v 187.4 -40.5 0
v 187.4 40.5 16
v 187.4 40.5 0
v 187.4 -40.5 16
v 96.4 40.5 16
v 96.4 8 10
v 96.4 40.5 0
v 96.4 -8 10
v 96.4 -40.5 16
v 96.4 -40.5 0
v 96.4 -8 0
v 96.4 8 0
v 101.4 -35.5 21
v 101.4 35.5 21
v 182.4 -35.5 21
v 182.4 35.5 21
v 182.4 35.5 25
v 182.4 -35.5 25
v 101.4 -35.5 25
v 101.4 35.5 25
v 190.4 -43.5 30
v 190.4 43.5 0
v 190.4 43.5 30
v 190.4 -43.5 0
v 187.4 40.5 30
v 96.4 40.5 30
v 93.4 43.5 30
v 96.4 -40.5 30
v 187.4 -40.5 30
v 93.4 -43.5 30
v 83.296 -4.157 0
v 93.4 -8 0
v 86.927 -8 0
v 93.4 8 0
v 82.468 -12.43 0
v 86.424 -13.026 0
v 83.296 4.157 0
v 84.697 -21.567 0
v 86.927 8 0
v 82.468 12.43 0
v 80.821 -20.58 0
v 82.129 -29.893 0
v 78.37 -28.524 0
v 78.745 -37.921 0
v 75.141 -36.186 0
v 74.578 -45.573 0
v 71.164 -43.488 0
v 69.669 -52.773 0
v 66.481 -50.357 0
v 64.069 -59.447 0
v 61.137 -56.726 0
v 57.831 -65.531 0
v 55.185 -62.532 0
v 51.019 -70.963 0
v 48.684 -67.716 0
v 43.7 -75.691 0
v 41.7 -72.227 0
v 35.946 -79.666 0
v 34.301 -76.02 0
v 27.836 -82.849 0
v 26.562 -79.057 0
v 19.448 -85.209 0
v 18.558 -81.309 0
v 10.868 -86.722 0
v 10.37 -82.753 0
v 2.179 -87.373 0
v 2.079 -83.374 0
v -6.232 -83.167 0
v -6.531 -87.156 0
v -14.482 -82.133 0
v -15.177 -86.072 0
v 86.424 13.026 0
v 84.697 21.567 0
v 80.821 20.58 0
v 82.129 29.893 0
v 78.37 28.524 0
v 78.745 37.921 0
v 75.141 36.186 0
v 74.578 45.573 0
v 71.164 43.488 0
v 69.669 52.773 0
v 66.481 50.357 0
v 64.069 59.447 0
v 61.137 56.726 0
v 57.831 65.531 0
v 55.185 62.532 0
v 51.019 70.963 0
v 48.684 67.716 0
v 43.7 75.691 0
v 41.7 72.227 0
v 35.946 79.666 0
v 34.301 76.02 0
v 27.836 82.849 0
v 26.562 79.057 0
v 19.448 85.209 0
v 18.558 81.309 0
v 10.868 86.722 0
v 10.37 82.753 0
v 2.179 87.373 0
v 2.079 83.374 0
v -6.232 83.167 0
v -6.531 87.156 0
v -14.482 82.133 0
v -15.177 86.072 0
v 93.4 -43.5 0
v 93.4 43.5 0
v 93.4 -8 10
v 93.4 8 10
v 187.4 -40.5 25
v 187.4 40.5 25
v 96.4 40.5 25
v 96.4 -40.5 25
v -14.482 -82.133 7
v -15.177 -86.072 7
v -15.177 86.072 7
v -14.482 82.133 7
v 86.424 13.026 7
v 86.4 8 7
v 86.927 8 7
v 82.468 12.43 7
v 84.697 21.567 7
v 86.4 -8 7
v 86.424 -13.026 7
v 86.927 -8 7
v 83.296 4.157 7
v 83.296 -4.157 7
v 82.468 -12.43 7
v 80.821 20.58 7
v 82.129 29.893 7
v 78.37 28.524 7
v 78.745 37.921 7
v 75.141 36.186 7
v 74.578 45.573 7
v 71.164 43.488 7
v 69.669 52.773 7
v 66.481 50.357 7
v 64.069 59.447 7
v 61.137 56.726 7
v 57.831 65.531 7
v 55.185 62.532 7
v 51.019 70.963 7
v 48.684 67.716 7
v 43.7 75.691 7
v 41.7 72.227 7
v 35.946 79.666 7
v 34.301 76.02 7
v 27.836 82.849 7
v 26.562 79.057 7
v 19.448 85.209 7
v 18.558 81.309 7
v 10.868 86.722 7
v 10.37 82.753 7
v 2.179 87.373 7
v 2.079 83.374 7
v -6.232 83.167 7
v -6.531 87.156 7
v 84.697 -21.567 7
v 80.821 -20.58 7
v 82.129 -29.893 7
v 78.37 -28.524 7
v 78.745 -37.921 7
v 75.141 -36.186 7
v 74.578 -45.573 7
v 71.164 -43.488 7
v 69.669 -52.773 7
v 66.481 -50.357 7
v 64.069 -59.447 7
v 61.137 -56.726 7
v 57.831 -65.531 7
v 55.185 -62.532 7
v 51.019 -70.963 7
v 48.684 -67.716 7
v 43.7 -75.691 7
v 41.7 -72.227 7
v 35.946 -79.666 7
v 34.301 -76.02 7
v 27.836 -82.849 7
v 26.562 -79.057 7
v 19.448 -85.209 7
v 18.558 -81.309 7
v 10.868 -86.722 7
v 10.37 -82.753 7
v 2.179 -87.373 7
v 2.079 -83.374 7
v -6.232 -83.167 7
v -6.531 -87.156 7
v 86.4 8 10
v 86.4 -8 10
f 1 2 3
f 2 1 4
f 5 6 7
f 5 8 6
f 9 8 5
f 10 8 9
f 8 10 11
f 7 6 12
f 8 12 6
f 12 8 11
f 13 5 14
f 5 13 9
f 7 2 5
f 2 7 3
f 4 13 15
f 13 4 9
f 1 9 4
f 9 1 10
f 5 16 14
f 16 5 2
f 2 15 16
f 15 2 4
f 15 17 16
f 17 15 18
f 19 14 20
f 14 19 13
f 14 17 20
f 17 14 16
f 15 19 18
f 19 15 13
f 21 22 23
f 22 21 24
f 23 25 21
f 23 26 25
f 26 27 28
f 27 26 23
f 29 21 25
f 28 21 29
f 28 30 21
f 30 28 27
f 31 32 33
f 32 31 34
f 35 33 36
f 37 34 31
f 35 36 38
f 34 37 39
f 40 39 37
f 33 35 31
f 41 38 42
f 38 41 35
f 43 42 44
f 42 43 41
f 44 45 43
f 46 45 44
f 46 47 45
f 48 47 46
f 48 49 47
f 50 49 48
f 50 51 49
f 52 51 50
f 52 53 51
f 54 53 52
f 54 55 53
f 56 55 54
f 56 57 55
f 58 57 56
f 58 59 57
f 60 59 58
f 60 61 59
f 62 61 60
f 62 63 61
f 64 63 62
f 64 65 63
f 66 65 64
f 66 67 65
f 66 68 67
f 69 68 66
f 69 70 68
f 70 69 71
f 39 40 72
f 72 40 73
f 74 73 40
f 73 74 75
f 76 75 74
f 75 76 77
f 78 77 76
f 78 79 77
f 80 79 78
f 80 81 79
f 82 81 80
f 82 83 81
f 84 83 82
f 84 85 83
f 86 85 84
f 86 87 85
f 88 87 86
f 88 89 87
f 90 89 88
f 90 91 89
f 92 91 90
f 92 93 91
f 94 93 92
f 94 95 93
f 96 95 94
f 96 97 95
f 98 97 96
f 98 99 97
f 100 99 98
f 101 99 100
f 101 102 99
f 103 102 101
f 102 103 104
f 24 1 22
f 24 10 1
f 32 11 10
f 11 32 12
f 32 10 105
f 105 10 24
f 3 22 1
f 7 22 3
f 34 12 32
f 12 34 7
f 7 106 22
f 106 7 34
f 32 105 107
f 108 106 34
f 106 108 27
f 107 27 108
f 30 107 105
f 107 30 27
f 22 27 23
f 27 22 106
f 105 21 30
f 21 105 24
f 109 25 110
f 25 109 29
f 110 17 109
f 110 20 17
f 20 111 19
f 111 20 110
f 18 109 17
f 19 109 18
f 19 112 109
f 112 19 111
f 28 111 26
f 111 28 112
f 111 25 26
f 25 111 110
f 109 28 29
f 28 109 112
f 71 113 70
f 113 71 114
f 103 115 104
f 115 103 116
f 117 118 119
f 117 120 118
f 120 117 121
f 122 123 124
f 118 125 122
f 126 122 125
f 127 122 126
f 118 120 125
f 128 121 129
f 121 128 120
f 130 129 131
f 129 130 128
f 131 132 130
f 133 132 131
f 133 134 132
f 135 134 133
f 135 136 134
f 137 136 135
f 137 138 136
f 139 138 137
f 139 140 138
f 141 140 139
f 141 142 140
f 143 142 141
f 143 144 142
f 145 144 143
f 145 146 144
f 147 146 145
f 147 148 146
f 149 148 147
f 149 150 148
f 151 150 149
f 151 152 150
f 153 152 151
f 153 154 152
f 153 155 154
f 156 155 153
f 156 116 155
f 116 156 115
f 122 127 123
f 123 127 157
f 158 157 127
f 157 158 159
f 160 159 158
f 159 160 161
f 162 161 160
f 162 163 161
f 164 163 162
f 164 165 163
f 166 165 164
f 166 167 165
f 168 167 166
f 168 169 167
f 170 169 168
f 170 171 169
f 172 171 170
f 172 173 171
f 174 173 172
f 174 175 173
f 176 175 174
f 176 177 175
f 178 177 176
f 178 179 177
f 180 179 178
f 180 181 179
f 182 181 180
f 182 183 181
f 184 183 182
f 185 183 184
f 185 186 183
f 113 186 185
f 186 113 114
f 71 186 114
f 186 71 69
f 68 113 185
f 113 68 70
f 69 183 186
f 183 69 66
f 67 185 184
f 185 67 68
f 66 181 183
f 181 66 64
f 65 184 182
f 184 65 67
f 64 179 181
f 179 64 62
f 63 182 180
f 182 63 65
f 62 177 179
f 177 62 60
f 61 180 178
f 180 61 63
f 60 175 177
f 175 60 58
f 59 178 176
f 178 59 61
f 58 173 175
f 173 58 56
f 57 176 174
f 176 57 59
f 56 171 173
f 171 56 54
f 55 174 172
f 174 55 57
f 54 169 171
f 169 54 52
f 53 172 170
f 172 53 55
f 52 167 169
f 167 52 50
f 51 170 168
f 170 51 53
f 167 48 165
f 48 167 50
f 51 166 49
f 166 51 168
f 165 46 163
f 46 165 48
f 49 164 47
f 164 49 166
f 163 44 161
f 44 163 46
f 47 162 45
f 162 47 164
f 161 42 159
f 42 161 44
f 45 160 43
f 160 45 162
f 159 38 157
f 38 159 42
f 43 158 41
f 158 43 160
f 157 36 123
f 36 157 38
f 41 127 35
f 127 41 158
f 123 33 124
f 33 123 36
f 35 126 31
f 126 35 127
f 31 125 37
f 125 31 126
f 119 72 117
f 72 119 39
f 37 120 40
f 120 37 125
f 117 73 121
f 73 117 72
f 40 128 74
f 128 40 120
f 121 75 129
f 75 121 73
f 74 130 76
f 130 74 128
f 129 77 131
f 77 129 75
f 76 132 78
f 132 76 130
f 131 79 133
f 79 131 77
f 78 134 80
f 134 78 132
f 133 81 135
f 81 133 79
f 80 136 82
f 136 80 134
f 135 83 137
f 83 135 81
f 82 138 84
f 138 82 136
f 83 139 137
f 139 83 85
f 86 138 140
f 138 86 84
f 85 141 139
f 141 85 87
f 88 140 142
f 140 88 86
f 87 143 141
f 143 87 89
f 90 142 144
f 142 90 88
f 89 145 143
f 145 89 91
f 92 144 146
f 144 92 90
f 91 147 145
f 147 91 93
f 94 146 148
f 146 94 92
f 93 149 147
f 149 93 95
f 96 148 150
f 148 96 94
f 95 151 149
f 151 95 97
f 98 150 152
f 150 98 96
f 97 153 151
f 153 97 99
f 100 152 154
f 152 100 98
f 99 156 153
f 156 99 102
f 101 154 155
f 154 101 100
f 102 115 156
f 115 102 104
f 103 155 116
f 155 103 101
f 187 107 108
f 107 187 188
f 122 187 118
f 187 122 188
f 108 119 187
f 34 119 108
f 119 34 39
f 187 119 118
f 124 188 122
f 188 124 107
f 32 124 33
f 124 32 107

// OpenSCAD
// Scanning Rig - Turntable-to-stand link (base collar + spar + stand dock)
// Render this file to generate rig_link.stl
//
// Authored about the platter axis so it sits in assembled position against
// turntable_base.stl for CI's mating-pair interference check.

include <_scanning_rig.scad>

rig_link();
